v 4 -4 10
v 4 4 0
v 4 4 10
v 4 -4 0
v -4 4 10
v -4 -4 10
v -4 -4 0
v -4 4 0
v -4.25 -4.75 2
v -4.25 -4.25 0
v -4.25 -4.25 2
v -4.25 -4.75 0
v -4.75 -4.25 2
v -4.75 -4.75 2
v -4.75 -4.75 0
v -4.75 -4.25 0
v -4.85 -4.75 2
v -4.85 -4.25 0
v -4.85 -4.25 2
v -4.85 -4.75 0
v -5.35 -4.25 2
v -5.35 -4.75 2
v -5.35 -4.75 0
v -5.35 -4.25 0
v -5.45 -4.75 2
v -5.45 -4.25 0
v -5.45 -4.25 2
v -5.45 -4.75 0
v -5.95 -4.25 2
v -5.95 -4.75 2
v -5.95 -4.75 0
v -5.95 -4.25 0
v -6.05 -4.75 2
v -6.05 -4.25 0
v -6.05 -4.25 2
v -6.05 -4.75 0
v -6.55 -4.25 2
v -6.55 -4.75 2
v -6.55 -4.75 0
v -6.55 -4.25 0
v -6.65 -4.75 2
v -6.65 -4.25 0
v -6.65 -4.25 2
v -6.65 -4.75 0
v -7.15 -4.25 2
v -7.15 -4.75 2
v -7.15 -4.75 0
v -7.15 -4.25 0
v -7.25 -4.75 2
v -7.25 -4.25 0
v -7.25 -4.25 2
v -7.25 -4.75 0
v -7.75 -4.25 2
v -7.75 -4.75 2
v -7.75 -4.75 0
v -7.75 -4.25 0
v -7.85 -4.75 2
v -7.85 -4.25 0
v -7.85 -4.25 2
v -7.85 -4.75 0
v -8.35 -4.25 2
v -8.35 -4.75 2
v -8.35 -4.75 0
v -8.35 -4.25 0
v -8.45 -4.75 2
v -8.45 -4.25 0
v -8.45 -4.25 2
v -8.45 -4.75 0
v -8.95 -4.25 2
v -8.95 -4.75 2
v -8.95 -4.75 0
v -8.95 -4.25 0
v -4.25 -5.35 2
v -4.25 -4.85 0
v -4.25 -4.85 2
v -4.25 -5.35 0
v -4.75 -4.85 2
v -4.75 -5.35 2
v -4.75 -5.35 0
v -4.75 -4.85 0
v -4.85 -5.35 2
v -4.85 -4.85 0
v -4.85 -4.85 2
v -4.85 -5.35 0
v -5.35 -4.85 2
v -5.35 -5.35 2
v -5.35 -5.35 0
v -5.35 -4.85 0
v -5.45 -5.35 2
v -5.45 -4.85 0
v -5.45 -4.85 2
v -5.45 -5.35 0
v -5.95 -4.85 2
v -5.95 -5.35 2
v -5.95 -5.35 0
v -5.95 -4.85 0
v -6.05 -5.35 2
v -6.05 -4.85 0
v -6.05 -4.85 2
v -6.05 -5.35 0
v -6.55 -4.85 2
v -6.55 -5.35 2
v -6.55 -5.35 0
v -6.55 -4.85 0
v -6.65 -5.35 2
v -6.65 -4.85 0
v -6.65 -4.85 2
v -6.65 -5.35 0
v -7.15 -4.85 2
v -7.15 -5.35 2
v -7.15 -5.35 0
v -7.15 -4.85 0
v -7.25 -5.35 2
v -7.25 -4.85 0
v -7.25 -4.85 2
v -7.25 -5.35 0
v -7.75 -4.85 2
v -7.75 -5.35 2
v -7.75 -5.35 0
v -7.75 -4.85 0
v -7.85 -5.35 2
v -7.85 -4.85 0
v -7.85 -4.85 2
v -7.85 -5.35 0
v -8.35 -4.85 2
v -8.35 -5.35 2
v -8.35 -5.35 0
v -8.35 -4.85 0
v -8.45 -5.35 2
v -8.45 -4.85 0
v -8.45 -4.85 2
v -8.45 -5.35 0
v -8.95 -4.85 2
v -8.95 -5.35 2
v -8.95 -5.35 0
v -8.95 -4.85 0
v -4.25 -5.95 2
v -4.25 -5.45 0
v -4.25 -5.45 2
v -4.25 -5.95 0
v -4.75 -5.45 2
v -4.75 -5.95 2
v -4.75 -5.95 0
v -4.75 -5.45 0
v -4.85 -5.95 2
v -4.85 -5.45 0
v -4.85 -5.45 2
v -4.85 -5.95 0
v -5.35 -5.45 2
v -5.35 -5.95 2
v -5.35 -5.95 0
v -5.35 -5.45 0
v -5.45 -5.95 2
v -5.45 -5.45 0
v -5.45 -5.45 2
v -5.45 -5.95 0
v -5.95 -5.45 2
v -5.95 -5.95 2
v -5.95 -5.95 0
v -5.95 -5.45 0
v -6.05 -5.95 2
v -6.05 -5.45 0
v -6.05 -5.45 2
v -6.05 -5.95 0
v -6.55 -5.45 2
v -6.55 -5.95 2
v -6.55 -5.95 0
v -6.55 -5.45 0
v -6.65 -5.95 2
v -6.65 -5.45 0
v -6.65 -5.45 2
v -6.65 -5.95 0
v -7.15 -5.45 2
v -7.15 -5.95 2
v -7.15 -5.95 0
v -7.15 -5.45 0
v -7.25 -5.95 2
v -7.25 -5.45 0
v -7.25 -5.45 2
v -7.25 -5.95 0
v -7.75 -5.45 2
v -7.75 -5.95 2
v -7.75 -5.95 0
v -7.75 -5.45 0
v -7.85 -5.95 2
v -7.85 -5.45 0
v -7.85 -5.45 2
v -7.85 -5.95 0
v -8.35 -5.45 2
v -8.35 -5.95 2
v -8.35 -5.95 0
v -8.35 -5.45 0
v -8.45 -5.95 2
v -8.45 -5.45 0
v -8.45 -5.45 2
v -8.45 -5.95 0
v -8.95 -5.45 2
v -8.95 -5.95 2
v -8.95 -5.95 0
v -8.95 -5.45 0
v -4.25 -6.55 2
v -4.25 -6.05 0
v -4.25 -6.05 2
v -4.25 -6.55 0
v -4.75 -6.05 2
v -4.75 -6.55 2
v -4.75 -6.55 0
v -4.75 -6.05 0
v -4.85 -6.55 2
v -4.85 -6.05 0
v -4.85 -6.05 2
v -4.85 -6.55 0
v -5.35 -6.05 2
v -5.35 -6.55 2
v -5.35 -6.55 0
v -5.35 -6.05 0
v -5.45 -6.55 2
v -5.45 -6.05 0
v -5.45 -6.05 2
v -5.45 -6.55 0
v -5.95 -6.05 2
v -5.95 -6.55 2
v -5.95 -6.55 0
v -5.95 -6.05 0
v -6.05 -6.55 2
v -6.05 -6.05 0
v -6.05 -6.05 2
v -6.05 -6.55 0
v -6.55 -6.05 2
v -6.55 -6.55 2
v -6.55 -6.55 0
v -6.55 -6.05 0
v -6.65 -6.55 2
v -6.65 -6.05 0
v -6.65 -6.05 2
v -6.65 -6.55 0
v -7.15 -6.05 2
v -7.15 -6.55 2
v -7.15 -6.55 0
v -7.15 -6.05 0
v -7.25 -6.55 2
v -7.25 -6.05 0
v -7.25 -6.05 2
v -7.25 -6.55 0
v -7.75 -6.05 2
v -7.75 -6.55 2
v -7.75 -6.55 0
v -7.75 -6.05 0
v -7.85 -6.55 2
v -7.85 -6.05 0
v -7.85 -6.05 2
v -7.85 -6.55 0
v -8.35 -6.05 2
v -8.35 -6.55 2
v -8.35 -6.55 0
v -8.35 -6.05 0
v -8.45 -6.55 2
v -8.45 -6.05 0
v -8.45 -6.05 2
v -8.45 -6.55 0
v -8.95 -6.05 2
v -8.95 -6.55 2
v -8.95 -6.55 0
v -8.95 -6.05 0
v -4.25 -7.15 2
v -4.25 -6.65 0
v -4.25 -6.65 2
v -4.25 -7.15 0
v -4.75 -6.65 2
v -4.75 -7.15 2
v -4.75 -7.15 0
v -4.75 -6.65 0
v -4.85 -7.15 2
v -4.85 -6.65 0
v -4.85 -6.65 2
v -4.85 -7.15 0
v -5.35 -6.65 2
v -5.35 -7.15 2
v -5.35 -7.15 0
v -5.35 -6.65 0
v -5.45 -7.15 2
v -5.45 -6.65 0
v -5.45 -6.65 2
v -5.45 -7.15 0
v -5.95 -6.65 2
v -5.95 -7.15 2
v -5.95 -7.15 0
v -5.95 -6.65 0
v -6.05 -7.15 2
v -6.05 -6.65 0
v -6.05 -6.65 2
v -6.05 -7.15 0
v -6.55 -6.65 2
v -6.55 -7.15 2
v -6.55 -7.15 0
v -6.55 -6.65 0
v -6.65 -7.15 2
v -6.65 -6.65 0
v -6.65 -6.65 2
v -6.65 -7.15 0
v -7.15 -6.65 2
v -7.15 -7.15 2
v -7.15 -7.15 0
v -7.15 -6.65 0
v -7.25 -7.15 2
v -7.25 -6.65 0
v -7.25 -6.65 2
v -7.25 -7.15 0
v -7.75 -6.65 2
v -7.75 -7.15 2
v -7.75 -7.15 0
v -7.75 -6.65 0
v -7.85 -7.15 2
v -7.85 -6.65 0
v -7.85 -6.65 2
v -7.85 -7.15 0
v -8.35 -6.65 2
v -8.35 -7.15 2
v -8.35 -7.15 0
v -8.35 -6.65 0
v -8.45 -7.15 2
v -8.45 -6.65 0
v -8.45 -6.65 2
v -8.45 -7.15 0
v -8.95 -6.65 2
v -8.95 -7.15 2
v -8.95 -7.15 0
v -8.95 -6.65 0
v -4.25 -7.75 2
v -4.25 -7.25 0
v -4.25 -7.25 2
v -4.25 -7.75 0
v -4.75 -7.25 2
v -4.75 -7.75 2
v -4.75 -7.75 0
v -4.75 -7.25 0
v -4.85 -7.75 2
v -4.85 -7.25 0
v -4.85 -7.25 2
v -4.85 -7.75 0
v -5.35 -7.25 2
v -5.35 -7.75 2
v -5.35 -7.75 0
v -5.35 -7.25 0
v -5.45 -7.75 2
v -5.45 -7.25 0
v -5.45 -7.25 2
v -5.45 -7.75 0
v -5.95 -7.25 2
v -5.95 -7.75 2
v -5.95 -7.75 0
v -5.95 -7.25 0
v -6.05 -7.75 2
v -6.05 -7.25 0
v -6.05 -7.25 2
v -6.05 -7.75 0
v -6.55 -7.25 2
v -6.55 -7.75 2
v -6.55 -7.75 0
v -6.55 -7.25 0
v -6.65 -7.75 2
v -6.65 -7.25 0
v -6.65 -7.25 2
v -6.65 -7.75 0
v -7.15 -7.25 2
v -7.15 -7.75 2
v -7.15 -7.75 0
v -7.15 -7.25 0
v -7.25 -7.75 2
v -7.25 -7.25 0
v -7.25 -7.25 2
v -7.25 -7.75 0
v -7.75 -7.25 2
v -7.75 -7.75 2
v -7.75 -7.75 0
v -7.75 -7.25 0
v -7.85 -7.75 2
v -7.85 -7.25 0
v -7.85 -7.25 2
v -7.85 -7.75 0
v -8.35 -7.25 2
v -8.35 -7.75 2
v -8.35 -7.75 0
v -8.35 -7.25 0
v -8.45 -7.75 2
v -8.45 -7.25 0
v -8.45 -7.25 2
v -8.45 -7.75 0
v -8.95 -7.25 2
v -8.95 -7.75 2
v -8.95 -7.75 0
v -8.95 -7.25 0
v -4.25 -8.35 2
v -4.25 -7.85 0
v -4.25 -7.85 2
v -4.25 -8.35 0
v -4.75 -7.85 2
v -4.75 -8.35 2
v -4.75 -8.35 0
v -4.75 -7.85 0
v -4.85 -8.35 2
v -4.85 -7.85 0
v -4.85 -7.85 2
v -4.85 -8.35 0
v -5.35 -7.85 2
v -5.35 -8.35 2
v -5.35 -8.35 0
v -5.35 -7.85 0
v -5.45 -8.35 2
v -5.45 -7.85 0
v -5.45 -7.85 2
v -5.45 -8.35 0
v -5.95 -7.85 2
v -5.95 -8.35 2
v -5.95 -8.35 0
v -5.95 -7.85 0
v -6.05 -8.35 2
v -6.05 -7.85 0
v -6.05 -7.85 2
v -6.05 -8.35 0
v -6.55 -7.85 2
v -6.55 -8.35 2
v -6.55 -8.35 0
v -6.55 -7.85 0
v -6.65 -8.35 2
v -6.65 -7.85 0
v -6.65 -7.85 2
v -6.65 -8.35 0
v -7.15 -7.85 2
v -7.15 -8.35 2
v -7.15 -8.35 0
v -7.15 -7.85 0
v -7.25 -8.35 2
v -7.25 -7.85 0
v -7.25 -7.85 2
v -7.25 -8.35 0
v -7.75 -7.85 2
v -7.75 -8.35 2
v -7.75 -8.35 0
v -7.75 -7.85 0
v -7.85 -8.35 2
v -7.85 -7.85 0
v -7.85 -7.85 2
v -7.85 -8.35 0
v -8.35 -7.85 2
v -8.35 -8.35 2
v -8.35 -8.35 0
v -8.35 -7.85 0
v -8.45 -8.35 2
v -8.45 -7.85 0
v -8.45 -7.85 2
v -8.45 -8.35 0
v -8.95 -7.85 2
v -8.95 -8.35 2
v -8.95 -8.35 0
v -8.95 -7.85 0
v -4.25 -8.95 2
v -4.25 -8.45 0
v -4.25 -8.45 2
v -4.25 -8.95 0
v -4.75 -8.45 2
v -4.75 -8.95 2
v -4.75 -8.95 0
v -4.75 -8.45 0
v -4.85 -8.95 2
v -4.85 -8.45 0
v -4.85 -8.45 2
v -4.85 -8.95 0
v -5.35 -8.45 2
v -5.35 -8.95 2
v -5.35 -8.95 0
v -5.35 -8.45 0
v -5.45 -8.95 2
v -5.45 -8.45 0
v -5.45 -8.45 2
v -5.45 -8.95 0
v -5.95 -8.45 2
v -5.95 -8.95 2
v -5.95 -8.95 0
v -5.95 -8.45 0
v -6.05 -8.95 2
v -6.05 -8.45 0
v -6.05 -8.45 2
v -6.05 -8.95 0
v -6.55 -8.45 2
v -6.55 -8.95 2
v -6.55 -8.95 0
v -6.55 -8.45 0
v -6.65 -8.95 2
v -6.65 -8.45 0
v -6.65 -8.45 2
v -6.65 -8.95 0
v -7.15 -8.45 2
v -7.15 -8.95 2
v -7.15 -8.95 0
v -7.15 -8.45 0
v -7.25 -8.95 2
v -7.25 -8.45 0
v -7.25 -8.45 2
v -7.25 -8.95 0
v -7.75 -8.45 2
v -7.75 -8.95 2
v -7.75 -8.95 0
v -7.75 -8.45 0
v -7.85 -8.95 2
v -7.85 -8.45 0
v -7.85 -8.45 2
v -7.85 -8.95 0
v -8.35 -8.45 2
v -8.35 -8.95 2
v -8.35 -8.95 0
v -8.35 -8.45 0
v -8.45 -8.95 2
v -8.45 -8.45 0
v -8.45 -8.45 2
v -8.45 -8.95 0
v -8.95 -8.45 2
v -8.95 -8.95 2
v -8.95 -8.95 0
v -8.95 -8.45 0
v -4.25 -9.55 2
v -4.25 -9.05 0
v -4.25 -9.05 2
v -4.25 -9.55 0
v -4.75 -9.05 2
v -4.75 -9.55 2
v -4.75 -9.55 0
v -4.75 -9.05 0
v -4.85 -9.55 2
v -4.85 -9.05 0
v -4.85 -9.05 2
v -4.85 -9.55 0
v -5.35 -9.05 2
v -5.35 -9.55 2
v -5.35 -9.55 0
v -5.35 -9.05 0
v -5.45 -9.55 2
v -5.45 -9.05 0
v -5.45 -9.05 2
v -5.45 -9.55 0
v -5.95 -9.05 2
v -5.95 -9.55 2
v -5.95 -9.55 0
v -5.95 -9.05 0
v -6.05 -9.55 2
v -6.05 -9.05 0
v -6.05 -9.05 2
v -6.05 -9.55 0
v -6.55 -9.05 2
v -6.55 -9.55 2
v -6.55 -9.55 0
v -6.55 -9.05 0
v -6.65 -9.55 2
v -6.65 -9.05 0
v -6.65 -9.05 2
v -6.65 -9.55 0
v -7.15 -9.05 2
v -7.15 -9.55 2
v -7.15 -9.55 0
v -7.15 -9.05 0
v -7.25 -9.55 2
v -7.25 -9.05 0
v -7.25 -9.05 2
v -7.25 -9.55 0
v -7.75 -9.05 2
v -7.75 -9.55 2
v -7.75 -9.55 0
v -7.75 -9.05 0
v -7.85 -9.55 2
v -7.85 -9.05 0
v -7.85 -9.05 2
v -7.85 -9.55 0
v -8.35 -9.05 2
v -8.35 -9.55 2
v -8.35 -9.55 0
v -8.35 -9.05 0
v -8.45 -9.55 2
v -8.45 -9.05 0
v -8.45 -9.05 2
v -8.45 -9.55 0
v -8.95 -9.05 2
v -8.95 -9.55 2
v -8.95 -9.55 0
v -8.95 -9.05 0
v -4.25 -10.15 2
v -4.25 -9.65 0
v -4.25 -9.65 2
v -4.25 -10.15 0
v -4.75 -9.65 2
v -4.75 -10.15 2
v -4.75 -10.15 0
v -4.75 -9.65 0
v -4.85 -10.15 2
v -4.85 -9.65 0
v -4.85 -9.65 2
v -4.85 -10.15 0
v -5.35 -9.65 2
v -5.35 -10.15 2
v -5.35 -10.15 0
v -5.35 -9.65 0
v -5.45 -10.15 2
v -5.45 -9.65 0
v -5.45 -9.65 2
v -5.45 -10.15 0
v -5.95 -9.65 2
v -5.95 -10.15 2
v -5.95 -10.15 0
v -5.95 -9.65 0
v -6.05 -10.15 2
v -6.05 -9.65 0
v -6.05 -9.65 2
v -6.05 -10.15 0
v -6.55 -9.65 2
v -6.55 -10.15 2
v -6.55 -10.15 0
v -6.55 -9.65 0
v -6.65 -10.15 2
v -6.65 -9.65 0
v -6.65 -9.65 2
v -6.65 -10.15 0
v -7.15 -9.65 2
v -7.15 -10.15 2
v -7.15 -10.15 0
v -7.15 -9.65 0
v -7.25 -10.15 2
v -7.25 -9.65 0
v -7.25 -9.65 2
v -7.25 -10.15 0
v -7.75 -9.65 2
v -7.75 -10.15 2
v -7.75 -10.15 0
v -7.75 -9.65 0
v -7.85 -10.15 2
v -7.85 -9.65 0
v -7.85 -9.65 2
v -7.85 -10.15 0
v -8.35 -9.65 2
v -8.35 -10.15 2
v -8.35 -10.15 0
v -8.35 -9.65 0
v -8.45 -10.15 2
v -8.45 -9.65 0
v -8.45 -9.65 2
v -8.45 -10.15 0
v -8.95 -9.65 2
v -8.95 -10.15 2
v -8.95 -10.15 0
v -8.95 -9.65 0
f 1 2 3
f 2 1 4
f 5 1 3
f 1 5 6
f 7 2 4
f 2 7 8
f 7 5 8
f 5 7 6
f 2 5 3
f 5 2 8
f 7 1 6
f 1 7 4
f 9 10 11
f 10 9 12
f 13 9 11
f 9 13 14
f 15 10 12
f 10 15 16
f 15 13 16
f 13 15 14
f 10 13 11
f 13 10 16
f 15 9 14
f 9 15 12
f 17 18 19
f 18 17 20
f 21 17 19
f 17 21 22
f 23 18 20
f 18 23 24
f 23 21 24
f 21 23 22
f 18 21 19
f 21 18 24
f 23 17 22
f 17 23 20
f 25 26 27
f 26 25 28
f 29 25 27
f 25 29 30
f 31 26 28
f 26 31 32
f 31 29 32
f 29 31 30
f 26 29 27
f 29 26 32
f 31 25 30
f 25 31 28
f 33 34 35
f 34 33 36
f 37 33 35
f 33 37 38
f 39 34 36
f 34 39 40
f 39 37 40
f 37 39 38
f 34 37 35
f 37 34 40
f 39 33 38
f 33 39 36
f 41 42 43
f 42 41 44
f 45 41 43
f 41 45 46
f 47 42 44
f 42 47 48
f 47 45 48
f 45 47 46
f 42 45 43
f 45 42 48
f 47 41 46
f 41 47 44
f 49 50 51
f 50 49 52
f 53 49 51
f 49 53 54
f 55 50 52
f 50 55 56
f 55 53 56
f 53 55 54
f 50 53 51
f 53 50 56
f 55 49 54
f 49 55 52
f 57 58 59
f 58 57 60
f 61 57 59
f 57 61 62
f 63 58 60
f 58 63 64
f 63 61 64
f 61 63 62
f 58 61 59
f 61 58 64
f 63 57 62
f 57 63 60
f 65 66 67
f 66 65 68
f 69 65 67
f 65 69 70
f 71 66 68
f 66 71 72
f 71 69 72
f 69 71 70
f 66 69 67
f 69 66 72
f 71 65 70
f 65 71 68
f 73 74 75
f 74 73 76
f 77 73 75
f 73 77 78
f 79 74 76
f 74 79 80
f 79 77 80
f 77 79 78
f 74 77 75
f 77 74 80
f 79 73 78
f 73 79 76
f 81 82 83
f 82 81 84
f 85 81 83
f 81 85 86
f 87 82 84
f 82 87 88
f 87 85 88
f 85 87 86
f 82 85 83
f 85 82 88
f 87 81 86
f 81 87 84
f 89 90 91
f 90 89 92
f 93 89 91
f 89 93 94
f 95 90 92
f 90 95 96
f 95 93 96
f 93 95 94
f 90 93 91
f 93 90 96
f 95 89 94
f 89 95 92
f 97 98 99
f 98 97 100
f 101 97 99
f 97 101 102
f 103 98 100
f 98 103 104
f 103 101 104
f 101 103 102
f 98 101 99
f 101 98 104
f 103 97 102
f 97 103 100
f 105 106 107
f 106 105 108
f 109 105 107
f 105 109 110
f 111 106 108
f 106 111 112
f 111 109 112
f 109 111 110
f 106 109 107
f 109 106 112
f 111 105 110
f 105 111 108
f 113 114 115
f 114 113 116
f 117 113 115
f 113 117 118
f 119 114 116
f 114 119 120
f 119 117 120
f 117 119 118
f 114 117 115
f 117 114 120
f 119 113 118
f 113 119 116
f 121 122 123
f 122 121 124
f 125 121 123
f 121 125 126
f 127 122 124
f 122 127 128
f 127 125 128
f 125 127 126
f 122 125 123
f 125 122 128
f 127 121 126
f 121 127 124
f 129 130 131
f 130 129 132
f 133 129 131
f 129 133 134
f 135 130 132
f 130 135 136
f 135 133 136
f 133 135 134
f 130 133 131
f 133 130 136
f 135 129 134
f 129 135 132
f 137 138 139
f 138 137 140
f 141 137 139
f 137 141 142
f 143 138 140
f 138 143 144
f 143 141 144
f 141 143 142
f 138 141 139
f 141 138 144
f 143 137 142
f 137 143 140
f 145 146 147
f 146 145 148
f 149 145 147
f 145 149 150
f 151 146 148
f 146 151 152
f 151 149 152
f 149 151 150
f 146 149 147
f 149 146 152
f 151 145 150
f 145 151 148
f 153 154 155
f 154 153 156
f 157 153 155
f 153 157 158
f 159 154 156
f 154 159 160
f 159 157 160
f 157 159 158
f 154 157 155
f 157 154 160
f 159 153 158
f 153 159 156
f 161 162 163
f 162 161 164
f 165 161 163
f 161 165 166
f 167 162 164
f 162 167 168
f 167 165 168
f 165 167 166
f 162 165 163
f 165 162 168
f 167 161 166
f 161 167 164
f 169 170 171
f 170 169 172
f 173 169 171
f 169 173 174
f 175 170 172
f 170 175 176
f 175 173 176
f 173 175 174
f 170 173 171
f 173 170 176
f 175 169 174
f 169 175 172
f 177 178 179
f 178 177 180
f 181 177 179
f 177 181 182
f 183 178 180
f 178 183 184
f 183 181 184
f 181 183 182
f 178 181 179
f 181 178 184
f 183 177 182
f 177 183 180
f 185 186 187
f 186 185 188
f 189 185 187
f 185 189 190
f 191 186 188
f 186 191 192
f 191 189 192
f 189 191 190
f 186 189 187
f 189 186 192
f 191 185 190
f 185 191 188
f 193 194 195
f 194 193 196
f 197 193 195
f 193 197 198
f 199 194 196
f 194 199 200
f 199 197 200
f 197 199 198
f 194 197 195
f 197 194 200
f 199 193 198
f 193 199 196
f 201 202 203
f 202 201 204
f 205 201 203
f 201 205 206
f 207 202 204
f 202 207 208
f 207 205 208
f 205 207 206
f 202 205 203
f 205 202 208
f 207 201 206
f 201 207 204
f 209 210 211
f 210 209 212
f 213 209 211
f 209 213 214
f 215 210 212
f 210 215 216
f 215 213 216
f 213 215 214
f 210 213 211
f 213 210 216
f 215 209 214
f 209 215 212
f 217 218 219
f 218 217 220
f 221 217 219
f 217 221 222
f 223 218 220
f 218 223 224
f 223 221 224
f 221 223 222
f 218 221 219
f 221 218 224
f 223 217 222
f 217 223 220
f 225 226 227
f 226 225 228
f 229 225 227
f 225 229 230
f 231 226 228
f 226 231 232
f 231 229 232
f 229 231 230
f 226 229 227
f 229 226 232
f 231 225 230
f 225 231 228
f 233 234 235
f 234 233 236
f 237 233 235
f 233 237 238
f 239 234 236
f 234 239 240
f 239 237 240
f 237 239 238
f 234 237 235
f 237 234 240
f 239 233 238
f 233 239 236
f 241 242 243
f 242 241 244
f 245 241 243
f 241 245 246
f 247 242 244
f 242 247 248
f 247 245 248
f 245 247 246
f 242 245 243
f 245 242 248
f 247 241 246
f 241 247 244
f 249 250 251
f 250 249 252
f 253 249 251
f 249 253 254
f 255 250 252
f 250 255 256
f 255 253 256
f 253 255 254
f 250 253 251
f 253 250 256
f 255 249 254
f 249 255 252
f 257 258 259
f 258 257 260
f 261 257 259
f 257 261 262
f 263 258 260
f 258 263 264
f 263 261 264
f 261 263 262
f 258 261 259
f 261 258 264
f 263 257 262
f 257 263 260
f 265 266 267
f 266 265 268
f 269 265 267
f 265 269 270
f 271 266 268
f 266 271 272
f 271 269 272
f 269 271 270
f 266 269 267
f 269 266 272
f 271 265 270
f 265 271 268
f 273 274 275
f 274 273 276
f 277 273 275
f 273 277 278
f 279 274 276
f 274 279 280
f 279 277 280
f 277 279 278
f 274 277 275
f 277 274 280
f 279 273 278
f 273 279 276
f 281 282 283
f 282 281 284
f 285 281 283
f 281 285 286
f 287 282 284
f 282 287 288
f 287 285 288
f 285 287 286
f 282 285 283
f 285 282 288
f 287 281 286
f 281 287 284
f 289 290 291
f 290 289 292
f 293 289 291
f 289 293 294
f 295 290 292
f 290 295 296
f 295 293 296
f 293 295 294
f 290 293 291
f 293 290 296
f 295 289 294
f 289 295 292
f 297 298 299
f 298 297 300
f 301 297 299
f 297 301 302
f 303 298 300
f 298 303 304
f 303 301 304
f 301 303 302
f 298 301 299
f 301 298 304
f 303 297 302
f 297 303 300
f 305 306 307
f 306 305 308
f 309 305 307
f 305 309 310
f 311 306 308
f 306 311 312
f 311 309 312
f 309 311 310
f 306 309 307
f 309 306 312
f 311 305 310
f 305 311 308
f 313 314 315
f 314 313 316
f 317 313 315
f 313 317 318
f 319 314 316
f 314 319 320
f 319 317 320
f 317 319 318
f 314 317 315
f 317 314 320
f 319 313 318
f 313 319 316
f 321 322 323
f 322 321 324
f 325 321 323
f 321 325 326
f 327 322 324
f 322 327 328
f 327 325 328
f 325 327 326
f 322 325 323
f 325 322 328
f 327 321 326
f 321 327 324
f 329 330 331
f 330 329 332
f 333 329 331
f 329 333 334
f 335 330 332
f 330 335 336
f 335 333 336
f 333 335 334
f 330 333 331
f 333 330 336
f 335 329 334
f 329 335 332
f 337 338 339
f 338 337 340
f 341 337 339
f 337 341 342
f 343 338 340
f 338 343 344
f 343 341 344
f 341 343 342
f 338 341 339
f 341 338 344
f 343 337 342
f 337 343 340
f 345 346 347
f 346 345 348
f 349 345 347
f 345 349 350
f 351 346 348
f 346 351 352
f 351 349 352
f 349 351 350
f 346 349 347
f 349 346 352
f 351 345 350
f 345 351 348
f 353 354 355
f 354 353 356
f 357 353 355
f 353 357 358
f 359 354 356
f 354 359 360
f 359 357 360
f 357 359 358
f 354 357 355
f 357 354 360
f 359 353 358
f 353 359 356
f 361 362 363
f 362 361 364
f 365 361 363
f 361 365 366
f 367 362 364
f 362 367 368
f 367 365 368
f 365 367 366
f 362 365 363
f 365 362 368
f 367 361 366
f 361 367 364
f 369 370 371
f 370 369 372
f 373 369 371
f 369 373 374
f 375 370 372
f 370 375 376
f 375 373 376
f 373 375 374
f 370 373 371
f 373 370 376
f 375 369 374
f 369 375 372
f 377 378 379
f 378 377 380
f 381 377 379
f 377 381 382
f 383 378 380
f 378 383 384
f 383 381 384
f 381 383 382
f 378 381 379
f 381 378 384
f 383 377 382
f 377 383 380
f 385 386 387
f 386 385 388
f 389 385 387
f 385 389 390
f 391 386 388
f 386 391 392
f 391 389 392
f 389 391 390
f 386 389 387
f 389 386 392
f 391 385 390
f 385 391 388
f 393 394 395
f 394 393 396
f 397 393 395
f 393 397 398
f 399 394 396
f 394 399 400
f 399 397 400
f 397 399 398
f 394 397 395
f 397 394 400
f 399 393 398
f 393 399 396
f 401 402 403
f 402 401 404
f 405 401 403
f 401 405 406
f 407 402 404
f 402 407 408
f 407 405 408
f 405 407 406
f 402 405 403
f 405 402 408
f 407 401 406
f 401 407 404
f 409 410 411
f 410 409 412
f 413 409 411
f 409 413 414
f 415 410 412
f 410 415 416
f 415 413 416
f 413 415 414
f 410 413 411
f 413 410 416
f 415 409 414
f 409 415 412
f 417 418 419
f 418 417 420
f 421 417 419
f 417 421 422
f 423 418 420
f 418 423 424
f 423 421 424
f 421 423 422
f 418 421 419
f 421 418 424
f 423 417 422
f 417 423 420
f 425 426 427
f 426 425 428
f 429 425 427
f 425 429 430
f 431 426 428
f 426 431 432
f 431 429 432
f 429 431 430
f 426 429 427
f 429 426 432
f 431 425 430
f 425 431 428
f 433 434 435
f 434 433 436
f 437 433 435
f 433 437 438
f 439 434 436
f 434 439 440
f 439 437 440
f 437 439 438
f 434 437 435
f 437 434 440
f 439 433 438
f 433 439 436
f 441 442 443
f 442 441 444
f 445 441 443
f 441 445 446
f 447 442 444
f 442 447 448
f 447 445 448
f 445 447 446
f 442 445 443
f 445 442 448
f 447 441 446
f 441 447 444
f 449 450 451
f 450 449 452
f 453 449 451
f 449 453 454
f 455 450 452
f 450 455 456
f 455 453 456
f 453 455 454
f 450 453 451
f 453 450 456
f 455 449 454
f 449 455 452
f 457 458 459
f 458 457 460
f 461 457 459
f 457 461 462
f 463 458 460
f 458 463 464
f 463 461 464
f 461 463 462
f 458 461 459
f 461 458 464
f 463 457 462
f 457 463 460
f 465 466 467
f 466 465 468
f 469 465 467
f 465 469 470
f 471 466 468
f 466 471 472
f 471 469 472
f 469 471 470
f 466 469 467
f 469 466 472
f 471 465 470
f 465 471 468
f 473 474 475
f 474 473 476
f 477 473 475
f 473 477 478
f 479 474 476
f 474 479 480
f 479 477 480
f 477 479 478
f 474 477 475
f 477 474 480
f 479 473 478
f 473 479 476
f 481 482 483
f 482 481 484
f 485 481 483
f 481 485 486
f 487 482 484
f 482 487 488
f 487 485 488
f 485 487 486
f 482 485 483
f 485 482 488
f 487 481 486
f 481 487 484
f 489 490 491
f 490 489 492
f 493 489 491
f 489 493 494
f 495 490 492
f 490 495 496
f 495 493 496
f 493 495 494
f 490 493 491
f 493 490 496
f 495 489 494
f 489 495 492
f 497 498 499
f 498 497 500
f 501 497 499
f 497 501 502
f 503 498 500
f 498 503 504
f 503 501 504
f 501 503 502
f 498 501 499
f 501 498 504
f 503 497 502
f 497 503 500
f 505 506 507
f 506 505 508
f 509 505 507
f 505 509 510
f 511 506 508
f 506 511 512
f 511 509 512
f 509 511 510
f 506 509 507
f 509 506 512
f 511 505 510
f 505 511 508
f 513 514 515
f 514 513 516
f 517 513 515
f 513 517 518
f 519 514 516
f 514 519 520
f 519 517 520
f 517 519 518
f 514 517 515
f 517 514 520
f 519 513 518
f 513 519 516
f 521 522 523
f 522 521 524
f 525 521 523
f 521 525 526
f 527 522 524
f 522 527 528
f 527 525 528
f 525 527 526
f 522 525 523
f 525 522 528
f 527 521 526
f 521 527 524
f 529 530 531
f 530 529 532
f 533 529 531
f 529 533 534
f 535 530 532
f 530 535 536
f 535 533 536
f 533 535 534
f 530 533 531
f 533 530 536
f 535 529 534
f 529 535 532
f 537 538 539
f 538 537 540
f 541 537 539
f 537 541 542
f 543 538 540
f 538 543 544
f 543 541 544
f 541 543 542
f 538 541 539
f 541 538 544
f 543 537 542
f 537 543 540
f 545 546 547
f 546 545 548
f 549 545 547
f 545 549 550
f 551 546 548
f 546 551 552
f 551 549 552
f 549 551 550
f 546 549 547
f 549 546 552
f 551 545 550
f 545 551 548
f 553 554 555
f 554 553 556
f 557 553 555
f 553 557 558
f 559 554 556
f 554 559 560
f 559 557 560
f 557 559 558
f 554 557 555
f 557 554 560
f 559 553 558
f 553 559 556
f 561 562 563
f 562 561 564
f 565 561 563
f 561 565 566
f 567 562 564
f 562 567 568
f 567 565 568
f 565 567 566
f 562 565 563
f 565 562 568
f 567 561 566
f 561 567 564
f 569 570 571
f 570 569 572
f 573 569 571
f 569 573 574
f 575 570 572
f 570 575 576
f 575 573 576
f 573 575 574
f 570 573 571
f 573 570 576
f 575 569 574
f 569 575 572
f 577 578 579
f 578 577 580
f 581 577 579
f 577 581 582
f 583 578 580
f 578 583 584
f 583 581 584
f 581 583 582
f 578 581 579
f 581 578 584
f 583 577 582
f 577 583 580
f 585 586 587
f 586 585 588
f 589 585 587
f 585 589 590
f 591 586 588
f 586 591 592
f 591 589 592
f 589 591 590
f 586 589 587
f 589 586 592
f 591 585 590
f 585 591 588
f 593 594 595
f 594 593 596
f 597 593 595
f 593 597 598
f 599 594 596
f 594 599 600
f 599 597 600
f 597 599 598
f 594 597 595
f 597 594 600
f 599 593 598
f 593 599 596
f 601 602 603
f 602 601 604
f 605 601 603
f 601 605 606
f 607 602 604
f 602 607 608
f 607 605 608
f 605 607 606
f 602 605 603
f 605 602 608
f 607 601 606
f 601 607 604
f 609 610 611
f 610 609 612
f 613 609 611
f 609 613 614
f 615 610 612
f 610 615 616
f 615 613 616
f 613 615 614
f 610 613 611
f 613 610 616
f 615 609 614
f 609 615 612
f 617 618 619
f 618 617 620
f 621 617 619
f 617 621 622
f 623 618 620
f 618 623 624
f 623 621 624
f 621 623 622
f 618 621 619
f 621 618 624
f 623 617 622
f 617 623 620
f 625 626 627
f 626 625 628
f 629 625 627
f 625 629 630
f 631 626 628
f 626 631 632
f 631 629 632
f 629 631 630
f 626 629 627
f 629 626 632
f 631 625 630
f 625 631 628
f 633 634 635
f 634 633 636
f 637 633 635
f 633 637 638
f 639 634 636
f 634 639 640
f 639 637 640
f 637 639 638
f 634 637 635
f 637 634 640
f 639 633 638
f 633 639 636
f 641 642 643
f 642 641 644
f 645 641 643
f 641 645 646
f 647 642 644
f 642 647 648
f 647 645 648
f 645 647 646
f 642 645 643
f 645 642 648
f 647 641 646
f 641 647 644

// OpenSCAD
translate([0, 0, 5]) color([0,1,0,0.9]) cube([8, 8, 10], center=true);
translate([-4.5, -4.5, 1]) color([1,0,0]) cube([0.5, 0.5, 2], center=true);
translate([-5.1, -4.5, 1]) color([1,0,0]) cube([0.5, 0.5, 2], center=true);
translate([-5.7, -4.5, 1]) color([1,0,0]) cube([0.5, 0.5, 2], center=true);
translate([-6.3, -4.5, 1]) color([1,0,0]) cube([0.5, 0.5, 2], center=true);
translate([-6.9, -4.5, 1]) color([1,0,0]) cube([0.5, 0.5, 2], center=true);
translate([-7.5, -4.5, 1]) color([1,0,0]) cube([0.5, 0.5, 2], center=true);
translate([-8.1, -4.5, 1]) color([1,0,0]) cube([0.5, 0.5, 2], center=true);
translate([-8.7, -4.5, 1]) color([1,0,0]) cube([0.5, 0.5, 2], center=true);
translate([-4.5, -5.1, 1]) color([1,0,0]) cube([0.5, 0.5, 2], center=true);
translate([-5.1, -5.1, 1]) color([1,0,0]) cube([0.5, 0.5, 2], center=true);
translate([-5.7, -5.1, 1]) color([1,0,0]) cube([0.5, 0.5, 2], center=true);
translate([-6.3, -5.1, 1]) color([1,0,0]) cube([0.5, 0.5, 2], center=true);
translate([-6.9, -5.1, 1]) color([1,0,0]) cube([0.5, 0.5, 2], center=true);
translate([-7.5, -5.1, 1]) color([1,0,0]) cube([0.5, 0.5, 2], center=true);
translate([-8.1, -5.1, 1]) color([1,0,0]) cube([0.5, 0.5, 2], center=true);
translate([-8.7, -5.1, 1]) color([1,0,0]) cube([0.5, 0.5, 2], center=true);
translate([-4.5, -5.7, 1]) color([1,0,0]) cube([0.5, 0.5, 2], center=true);
translate([-5.1, -5.7, 1]) color([1,0,0]) cube([0.5, 0.5, 2], center=true);
translate([-5.7, -5.7, 1]) color([1,0,0]) cube([0.5, 0.5, 2], center=true);
translate([-6.3, -5.7, 1]) color([1,0,0]) cube([0.5, 0.5, 2], center=true);
translate([-6.9, -5.7, 1]) color([1,0,0]) cube([0.5, 0.5, 2], center=true);
translate([-7.5, -5.7, 1]) color([1,0,0]) cube([0.5, 0.5, 2], center=true);
translate([-8.1, -5.7, 1]) color([1,0,0]) cube([0.5, 0.5, 2], center=true);
translate([-8.7, -5.7, 1]) color([1,0,0]) cube([0.5, 0.5, 2], center=true);
translate([-4.5, -6.3, 1]) color([1,0,0]) cube([0.5, 0.5, 2], center=true);
translate([-5.1, -6.3, 1]) color([1,0,0]) cube([0.5, 0.5, 2], center=true);
translate([-5.7, -6.3, 1]) color([1,0,0]) cube([0.5, 0.5, 2], center=true);
translate([-6.3, -6.3, 1]) color([1,0,0]) cube([0.5, 0.5, 2], center=true);
translate([-6.9, -6.3, 1]) color([1,0,0]) cube([0.5, 0.5, 2], center=true);
translate([-7.5, -6.3, 1]) color([1,0,0]) cube([0.5, 0.5, 2], center=true);
translate([-8.1, -6.3, 1]) color([1,0,0]) cube([0.5, 0.5, 2], center=true);
translate([-8.7, -6.3, 1]) color([1,0,0]) cube([0.5, 0.5, 2], center=true);
translate([-4.5, -6.9, 1]) color([1,0,0]) cube([0.5, 0.5, 2], center=true);
translate([-5.1, -6.9, 1]) color([1,0,0]) cube([0.5, 0.5, 2], center=true);
translate([-5.7, -6.9, 1]) color([1,0,0]) cube([0.5, 0.5, 2], center=true);
translate([-6.3, -6.9, 1]) color([1,0,0]) cube([0.5, 0.5, 2], center=true);
translate([-6.9, -6.9, 1]) color([1,0,0]) cube([0.5, 0.5, 2], center=true);
translate([-7.5, -6.9, 1]) color([1,0,0]) cube([0.5, 0.5, 2], center=true);
translate([-8.1, -6.9, 1]) color([1,0,0]) cube([0.5, 0.5, 2], center=true);
translate([-8.7, -6.9, 1]) color([1,0,0]) cube([0.5, 0.5, 2], center=true);
translate([-4.5, -7.5, 1]) color([1,0,0]) cube([0.5, 0.5, 2], center=true);
translate([-5.1, -7.5, 1]) color([1,0,0]) cube([0.5, 0.5, 2], center=true);
translate([-5.7, -7.5, 1]) color([1,0,0]) cube([0.5, 0.5, 2], center=true);
translate([-6.3, -7.5, 1]) color([1,0,0]) cube([0.5, 0.5, 2], center=true);
translate([-6.9, -7.5, 1]) color([1,0,0]) cube([0.5, 0.5, 2], center=true);
translate([-7.5, -7.5, 1]) color([1,0,0]) cube([0.5, 0.5, 2], center=true);
translate([-8.1, -7.5, 1]) color([1,0,0]) cube([0.5, 0.5, 2], center=true);
translate([-8.7, -7.5, 1]) color([1,0,0]) cube([0.5, 0.5, 2], center=true);
translate([-4.5, -8.1, 1]) color([1,0,0]) cube([0.5, 0.5, 2], center=true);
translate([-5.1, -8.1, 1]) color([1,0,0]) cube([0.5, 0.5, 2], center=true);
translate([-5.7, -8.1, 1]) color([1,0,0]) cube([0.5, 0.5, 2], center=true);
translate([-6.3, -8.1, 1]) color([1,0,0]) cube([0.5, 0.5, 2], center=true);
translate([-6.9, -8.1, 1]) color([1,0,0]) cube([0.5, 0.5, 2], center=true);
translate([-7.5, -8.1, 1]) color([1,0,0]) cube([0.5, 0.5, 2], center=true);
translate([-8.1, -8.1, 1]) color([1,0,0]) cube([0.5, 0.5, 2], center=true);
translate([-8.7, -8.1, 1]) color([1,0,0]) cube([0.5, 0.5, 2], center=true);
translate([-4.5, -8.7, 1]) color([1,0,0]) cube([0.5, 0.5, 2], center=true);
translate([-5.1, -8.7, 1]) color([1,0,0]) cube([0.5, 0.5, 2], center=true);
translate([-5.7, -8.7, 1]) color([1,0,0]) cube([0.5, 0.5, 2], center=true);
translate([-6.3, -8.7, 1]) color([1,0,0]) cube([0.5, 0.5, 2], center=true);
translate([-6.9, -8.7, 1]) color([1,0,0]) cube([0.5, 0.5, 2], center=true);
translate([-7.5, -8.7, 1]) color([1,0,0]) cube([0.5, 0.5, 2], center=true);
translate([-8.1, -8.7, 1]) color([1,0,0]) cube([0.5, 0.5, 2], center=true);
translate([-8.7, -8.7, 1]) color([1,0,0]) cube([0.5, 0.5, 2], center=true);
translate([-4.5, -9.3, 1]) color([1,0,0]) cube([0.5, 0.5, 2], center=true);
translate([-5.1, -9.3, 1]) color([1,0,0]) cube([0.5, 0.5, 2], center=true);
translate([-5.7, -9.3, 1]) color([1,0,0]) cube([0.5, 0.5, 2], center=true);
translate([-6.3, -9.3, 1]) color([1,0,0]) cube([0.5, 0.5, 2], center=true);
translate([-6.9, -9.3, 1]) color([1,0,0]) cube([0.5, 0.5, 2], center=true);
translate([-7.5, -9.3, 1]) color([1,0,0]) cube([0.5, 0.5, 2], center=true);
translate([-8.1, -9.3, 1]) color([1,0,0]) cube([0.5, 0.5, 2], center=true);
translate([-8.7, -9.3, 1]) color([1,0,0]) cube([0.5, 0.5, 2], center=true);
translate([-4.5, -9.9, 1]) color([1,0,0]) cube([0.5, 0.5, 2], center=true);
translate([-5.1, -9.9, 1]) color([1,0,0]) cube([0.5, 0.5, 2], center=true);
translate([-5.7, -9.9, 1]) color([1,0,0]) cube([0.5, 0.5, 2], center=true);
translate([-6.3, -9.9, 1]) color([1,0,0]) cube([0.5, 0.5, 2], center=true);
translate([-6.9, -9.9, 1]) color([1,0,0]) cube([0.5, 0.5, 2], center=true);
translate([-7.5, -9.9, 1]) color([1,0,0]) cube([0.5, 0.5, 2], center=true);
translate([-8.1, -9.9, 1]) color([1,0,0]) cube([0.5, 0.5, 2], center=true);
translate([-8.7, -9.9, 1]) color([1,0,0]) cube([0.5, 0.5, 2], center=true);
